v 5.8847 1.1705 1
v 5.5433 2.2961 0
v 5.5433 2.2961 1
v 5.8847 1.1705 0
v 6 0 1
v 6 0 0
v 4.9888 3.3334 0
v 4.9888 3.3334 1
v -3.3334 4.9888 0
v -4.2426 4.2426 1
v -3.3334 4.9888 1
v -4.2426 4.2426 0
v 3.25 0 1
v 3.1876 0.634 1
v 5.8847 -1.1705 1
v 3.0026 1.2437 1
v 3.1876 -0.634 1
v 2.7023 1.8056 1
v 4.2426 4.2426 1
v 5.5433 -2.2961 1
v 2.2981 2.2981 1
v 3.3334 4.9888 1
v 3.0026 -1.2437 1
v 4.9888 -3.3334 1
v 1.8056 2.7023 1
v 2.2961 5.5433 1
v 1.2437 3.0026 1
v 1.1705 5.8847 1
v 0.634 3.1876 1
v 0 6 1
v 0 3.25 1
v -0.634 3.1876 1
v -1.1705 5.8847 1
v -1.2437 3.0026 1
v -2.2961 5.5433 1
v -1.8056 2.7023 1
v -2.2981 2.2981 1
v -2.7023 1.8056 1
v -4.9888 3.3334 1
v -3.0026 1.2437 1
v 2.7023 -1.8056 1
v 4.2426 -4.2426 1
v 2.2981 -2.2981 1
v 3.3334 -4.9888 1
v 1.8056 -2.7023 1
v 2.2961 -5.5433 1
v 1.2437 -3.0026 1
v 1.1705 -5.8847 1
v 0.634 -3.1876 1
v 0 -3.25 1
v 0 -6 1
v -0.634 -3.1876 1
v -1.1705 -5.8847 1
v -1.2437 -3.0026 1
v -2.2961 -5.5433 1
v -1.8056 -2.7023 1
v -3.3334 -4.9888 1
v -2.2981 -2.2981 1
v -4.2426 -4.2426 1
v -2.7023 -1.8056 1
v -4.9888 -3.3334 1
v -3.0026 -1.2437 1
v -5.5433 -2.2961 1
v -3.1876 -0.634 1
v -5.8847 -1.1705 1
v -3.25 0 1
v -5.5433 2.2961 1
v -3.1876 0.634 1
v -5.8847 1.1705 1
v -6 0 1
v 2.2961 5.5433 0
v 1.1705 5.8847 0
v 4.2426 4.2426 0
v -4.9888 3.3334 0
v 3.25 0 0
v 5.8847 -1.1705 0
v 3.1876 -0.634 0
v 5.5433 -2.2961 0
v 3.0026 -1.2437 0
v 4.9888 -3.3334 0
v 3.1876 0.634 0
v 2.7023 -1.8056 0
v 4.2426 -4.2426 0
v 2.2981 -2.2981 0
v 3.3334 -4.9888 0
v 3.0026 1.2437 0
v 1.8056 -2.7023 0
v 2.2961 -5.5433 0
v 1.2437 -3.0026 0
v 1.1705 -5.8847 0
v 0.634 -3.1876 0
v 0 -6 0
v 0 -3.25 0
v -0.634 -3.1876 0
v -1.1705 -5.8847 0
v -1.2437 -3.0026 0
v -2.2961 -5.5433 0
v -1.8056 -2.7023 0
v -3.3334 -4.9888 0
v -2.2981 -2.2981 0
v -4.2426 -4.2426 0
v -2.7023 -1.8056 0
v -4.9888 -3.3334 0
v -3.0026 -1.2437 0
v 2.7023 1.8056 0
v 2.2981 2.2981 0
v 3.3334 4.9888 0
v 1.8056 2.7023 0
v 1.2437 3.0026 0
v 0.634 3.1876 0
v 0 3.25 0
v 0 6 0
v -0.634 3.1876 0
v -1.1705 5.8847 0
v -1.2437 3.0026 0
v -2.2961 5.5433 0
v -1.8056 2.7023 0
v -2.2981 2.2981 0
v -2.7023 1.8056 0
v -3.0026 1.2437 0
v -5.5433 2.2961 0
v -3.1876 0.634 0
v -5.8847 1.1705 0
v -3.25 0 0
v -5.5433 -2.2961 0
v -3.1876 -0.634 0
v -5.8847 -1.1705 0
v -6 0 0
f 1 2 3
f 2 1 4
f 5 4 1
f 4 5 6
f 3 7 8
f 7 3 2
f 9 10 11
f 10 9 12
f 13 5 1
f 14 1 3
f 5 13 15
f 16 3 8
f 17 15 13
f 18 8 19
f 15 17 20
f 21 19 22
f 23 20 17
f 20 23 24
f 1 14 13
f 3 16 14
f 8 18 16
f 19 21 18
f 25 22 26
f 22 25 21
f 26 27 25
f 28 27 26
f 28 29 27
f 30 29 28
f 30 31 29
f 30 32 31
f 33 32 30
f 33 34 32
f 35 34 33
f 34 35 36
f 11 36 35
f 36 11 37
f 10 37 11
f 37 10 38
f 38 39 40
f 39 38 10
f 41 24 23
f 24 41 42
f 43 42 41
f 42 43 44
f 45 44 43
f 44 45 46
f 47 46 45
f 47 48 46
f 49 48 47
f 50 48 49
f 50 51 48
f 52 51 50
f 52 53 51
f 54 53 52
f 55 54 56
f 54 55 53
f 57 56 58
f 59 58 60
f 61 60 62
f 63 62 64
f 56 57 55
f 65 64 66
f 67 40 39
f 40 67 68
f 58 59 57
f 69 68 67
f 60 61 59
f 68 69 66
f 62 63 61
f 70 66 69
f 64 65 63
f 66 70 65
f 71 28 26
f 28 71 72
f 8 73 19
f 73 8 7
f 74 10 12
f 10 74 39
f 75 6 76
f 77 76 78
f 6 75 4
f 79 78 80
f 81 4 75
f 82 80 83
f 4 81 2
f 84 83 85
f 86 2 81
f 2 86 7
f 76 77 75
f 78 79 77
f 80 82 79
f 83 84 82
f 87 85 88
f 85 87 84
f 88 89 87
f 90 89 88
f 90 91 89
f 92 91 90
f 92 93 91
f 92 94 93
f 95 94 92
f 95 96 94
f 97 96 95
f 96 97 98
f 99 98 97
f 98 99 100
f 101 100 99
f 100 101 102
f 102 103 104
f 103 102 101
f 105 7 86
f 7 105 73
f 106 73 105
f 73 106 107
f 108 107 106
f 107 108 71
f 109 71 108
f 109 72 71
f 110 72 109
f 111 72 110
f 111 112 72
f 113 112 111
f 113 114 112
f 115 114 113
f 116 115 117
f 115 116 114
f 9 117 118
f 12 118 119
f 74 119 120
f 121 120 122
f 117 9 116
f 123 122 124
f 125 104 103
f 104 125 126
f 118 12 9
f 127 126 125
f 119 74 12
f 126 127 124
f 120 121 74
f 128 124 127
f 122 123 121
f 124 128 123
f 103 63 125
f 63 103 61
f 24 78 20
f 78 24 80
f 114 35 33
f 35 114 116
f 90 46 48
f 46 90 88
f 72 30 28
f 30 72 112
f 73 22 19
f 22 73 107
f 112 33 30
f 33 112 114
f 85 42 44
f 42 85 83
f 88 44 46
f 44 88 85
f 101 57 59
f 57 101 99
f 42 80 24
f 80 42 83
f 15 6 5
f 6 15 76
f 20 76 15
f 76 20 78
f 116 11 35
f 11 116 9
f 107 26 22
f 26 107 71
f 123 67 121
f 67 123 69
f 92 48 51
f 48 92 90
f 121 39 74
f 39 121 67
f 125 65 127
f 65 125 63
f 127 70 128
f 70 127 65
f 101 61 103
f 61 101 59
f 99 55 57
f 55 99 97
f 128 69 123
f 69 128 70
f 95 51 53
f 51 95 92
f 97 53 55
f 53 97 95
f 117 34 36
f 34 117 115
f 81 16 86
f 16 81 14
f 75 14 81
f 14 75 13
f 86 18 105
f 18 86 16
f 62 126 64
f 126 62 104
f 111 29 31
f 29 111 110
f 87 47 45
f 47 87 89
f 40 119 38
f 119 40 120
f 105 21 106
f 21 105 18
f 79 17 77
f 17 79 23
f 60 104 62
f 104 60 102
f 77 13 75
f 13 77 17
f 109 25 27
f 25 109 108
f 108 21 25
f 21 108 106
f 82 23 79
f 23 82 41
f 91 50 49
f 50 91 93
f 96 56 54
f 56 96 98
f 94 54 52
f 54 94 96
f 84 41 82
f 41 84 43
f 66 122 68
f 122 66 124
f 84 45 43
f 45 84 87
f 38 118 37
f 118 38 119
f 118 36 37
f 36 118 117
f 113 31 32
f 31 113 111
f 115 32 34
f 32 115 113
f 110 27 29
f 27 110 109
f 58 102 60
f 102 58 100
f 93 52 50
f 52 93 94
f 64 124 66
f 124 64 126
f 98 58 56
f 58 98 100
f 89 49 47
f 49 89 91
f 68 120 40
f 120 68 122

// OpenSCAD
// Purchased hardware envelope; no modeled threads, not print.
$fn=32;
difference(){cylinder(d=12,h=1);translate([0,0,-1])cylinder(d=6.5,h=3);}
